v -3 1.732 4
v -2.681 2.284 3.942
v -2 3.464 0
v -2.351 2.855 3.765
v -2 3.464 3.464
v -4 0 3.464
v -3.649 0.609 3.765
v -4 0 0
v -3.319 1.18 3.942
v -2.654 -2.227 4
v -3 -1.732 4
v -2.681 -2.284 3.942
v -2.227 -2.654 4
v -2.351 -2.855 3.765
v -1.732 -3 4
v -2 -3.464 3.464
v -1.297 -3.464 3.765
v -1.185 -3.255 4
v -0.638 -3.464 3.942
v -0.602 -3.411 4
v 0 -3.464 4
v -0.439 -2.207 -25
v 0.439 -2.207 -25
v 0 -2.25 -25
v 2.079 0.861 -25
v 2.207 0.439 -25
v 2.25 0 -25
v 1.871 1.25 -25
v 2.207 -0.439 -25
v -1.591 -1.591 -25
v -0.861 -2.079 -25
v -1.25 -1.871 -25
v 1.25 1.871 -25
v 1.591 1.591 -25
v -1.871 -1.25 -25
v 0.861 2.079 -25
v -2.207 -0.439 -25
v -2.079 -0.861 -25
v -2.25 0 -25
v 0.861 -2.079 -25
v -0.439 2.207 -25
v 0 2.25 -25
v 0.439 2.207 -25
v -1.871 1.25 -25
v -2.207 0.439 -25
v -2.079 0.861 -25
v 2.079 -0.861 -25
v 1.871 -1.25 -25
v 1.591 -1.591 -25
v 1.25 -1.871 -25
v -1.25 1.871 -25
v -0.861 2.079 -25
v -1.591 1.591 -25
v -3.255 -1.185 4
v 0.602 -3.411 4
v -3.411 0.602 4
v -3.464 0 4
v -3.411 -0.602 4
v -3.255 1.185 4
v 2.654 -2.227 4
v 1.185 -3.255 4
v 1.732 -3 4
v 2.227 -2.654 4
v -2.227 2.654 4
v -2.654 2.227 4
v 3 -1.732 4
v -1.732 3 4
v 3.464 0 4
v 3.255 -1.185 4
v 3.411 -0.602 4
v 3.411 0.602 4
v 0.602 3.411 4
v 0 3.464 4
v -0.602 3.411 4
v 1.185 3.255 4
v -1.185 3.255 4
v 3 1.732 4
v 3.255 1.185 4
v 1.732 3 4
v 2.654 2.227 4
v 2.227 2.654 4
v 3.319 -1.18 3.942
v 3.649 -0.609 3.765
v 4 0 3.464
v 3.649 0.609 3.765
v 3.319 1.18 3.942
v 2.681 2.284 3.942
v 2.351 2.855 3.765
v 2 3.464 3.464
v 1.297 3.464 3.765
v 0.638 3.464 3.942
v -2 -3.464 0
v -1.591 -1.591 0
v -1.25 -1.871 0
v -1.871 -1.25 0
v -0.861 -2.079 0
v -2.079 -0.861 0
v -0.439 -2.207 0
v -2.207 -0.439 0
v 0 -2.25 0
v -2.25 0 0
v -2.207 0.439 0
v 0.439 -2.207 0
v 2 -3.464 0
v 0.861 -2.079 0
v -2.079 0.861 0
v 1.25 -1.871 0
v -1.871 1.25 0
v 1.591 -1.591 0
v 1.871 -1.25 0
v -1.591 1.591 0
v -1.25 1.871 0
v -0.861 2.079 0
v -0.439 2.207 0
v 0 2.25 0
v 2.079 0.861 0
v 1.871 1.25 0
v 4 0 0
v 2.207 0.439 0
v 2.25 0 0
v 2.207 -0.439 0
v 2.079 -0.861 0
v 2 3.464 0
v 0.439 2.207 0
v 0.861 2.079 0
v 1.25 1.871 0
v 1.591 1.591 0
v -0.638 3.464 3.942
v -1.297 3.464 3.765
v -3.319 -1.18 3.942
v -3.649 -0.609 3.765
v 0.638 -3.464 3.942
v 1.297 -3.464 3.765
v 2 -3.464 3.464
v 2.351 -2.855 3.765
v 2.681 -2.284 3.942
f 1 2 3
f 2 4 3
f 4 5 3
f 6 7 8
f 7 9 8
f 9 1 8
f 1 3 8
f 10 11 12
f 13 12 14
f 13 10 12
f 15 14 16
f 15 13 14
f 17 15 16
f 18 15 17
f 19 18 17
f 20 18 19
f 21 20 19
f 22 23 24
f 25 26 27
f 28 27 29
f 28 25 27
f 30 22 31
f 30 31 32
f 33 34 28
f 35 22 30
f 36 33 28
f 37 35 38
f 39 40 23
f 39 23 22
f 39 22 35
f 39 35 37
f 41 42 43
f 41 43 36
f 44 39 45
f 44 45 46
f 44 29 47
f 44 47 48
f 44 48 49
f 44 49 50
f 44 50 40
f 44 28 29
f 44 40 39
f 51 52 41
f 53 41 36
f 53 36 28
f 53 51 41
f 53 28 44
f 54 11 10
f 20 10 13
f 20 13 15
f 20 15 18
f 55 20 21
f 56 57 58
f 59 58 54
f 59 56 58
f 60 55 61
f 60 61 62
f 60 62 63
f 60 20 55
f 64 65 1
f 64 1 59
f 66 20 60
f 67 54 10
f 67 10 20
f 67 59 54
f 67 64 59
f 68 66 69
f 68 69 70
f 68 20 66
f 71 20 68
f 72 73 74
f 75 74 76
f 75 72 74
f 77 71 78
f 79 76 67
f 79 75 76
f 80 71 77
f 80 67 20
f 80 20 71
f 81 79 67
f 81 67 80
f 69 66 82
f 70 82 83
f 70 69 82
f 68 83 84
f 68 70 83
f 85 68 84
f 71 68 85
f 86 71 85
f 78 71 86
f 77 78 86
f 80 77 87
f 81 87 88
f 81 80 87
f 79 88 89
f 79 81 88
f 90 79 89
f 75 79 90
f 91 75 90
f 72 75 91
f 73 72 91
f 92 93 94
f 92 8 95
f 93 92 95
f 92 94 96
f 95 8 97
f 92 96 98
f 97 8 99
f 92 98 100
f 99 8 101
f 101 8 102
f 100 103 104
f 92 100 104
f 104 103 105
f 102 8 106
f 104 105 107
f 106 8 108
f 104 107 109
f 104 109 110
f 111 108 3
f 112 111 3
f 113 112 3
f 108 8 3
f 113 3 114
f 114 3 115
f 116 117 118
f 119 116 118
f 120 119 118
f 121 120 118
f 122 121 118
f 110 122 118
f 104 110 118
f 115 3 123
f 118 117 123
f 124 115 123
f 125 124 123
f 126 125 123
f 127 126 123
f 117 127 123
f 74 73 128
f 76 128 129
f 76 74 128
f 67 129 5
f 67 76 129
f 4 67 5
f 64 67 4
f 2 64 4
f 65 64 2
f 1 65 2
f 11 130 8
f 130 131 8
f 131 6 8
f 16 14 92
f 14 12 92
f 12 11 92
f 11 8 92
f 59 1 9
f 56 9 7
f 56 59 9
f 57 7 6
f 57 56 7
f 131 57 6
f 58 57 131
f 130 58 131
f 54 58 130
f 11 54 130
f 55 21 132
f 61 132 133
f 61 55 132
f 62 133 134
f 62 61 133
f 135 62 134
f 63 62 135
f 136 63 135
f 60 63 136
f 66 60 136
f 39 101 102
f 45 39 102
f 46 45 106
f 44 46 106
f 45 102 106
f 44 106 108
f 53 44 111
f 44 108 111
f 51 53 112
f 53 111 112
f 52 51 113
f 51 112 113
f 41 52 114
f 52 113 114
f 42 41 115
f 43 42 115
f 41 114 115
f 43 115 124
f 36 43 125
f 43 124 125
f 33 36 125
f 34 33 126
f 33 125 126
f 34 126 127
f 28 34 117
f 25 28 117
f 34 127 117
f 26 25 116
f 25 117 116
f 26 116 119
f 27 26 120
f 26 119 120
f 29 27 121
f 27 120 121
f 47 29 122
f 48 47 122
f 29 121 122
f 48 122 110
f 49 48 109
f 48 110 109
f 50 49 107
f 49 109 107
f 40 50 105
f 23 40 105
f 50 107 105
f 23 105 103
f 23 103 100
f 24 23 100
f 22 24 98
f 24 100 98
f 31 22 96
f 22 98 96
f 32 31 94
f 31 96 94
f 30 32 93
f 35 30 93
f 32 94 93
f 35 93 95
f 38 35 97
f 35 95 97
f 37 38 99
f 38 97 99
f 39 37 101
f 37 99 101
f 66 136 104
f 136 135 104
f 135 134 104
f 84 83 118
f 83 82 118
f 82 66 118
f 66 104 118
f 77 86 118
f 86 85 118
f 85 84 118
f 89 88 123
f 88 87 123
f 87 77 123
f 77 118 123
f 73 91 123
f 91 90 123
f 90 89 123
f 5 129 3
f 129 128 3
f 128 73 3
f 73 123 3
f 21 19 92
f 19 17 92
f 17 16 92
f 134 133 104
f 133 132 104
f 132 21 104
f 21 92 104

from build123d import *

# Parameters (mm, degrees)
BOSS_EXTRUDE1_DEPTH = 4
SKETCH2_OUTSIDE_W   = 20.262
SKETCH2_OUTSIDE_H   = 19.19
SKETCH2_OUTSIDE_R   = 3.464101615
CUT_EXTRUDE1_DEPTH  = 4
CUT_EXTRUDE1_DRAFT  = -45
SKETCH3_R           = 2.25
BOSS_EXTRUDE2_DEPTH = 25


with BuildPart() as part:
    # Sketch1 → Boss-Extrude1 (new body)
    with BuildSketch(Plane.XY):
        Polygon((-2, 3.464101615), (-4, 0), (-2, -3.464101615), (2, -3.464101615), (4, 0), (2, 3.464101615), align=None)
    extrude(amount=BOSS_EXTRUDE1_DEPTH)


with BuildPart() as cut_extrude1_tool:
    # Sketch2 outside → Cut-Extrude1 (with draft: the straight prism first)
    with BuildSketch(Plane.XY.offset(4)):
        Rectangle(SKETCH2_OUTSIDE_W, SKETCH2_OUTSIDE_H)
        Circle(SKETCH2_OUTSIDE_R, mode=Mode.SUBTRACT)
    extrude(amount=-CUT_EXTRUDE1_DEPTH)
    # Cut-Extrude1: the draft: its side faces are tilted about the plane it starts from
    cut_extrude1_sides = [cut_extrude1_tool.faces().sort_by_distance(p)[0] for p in [
        (0, -9.595, 2),
        (10.131, 0, 2),
        (0, 9.595, 2),
        (-10.131, 0, 2),
        (-3.464101615, 0, 2),
    ]]
    draft(cut_extrude1_sides, Plane.XY.offset(4), CUT_EXTRUDE1_DRAFT)


with BuildPart() as part_1:
    add(part.part)

    # Cut-Extrude1: cut by cut_extrude1_tool
    add(cut_extrude1_tool.part, mode=Mode.SUBTRACT)

    # Sketch3 → Boss-Extrude2 (add)
    with BuildSketch(Plane(origin=(0, 0, 0), x_dir=(-1, 0, 0), z_dir=(0, 0, -1))):
        Circle(SKETCH3_R)
    extrude(amount=BOSS_EXTRUDE2_DEPTH)


solid = part_1.part
